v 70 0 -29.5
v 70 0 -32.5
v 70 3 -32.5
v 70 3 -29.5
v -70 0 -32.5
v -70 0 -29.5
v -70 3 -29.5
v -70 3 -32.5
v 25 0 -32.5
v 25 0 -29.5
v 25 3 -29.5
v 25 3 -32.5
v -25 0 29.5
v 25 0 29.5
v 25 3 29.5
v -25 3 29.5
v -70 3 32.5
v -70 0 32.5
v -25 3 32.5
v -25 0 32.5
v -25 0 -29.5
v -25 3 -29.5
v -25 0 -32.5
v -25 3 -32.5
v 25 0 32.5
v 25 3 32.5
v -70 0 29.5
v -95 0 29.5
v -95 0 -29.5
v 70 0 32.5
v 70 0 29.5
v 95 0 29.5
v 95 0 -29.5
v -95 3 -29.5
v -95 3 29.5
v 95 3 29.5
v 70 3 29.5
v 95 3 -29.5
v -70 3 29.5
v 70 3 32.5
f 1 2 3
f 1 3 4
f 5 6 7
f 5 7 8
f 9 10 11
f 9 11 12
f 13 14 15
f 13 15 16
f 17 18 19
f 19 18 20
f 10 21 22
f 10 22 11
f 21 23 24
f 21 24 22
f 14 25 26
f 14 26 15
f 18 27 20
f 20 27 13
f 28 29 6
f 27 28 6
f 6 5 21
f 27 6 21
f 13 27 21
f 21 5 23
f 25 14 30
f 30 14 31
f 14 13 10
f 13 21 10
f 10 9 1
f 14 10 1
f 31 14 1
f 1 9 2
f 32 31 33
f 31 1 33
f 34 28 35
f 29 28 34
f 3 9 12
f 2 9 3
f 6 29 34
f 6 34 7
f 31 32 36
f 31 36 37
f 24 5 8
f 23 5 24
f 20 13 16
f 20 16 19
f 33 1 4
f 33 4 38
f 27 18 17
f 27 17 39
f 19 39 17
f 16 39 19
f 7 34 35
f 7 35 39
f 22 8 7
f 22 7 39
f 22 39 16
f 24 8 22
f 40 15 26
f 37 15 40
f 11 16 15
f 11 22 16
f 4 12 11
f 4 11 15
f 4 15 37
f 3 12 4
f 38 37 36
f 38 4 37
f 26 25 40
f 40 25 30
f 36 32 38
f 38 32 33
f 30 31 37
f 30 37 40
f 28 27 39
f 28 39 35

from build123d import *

# Parameters (mm, degrees)
SKETCH1_W               = 190
SKETCH1_H               = 65
BOSS_EXTRUDE1_DEPTH     = 3
CUT_EXTRUDE1_DEPTH      = 101.450236436
CUT_EXTRUDE1_DEPTH_BACK = 3
SKETCH2_OUTSIDE_W       = 232.166
SKETCH2_OUTSIDE_H       = 107.166


with BuildPart() as part:
    # Sketch1 → Boss-Extrude1 (new body)
    with BuildSketch(Plane(origin=(0, 0, 0), x_dir=(1, 0, 0), z_dir=(0, 1, 0))):
        Rectangle(SKETCH1_W, SKETCH1_H)
    extrude(amount=BOSS_EXTRUDE1_DEPTH)

    # Sketch2 outside → Cut-Extrude1 (cut, two sides: drawn at the far end of the back side and taken through both)
    with BuildSketch(Plane(origin=(0, 3, 0), x_dir=(1, 0, 0), z_dir=(0, 1, 0)).offset(-CUT_EXTRUDE1_DEPTH_BACK)):
        Rectangle(SKETCH2_OUTSIDE_W, SKETCH2_OUTSIDE_H)
        Polygon((-95, 29.5), (-70, 29.5), (-70, 32.5), (-25, 32.5), (-25, 29.5), (25, 29.5), (25, 32.5), (70, 32.5), (70, 29.5), (95, 29.5), (95, -29.5), (70, -29.5), (70, -32.5), (25, -32.5), (25, -29.5), (-25, -29.5), (-25, -32.5), (-70, -32.5), (-70, -29.5), (-95, -29.5), align=None, mode=Mode.SUBTRACT)
    extrude(amount=CUT_EXTRUDE1_DEPTH + CUT_EXTRUDE1_DEPTH_BACK, mode=Mode.SUBTRACT)


solid = part.part
